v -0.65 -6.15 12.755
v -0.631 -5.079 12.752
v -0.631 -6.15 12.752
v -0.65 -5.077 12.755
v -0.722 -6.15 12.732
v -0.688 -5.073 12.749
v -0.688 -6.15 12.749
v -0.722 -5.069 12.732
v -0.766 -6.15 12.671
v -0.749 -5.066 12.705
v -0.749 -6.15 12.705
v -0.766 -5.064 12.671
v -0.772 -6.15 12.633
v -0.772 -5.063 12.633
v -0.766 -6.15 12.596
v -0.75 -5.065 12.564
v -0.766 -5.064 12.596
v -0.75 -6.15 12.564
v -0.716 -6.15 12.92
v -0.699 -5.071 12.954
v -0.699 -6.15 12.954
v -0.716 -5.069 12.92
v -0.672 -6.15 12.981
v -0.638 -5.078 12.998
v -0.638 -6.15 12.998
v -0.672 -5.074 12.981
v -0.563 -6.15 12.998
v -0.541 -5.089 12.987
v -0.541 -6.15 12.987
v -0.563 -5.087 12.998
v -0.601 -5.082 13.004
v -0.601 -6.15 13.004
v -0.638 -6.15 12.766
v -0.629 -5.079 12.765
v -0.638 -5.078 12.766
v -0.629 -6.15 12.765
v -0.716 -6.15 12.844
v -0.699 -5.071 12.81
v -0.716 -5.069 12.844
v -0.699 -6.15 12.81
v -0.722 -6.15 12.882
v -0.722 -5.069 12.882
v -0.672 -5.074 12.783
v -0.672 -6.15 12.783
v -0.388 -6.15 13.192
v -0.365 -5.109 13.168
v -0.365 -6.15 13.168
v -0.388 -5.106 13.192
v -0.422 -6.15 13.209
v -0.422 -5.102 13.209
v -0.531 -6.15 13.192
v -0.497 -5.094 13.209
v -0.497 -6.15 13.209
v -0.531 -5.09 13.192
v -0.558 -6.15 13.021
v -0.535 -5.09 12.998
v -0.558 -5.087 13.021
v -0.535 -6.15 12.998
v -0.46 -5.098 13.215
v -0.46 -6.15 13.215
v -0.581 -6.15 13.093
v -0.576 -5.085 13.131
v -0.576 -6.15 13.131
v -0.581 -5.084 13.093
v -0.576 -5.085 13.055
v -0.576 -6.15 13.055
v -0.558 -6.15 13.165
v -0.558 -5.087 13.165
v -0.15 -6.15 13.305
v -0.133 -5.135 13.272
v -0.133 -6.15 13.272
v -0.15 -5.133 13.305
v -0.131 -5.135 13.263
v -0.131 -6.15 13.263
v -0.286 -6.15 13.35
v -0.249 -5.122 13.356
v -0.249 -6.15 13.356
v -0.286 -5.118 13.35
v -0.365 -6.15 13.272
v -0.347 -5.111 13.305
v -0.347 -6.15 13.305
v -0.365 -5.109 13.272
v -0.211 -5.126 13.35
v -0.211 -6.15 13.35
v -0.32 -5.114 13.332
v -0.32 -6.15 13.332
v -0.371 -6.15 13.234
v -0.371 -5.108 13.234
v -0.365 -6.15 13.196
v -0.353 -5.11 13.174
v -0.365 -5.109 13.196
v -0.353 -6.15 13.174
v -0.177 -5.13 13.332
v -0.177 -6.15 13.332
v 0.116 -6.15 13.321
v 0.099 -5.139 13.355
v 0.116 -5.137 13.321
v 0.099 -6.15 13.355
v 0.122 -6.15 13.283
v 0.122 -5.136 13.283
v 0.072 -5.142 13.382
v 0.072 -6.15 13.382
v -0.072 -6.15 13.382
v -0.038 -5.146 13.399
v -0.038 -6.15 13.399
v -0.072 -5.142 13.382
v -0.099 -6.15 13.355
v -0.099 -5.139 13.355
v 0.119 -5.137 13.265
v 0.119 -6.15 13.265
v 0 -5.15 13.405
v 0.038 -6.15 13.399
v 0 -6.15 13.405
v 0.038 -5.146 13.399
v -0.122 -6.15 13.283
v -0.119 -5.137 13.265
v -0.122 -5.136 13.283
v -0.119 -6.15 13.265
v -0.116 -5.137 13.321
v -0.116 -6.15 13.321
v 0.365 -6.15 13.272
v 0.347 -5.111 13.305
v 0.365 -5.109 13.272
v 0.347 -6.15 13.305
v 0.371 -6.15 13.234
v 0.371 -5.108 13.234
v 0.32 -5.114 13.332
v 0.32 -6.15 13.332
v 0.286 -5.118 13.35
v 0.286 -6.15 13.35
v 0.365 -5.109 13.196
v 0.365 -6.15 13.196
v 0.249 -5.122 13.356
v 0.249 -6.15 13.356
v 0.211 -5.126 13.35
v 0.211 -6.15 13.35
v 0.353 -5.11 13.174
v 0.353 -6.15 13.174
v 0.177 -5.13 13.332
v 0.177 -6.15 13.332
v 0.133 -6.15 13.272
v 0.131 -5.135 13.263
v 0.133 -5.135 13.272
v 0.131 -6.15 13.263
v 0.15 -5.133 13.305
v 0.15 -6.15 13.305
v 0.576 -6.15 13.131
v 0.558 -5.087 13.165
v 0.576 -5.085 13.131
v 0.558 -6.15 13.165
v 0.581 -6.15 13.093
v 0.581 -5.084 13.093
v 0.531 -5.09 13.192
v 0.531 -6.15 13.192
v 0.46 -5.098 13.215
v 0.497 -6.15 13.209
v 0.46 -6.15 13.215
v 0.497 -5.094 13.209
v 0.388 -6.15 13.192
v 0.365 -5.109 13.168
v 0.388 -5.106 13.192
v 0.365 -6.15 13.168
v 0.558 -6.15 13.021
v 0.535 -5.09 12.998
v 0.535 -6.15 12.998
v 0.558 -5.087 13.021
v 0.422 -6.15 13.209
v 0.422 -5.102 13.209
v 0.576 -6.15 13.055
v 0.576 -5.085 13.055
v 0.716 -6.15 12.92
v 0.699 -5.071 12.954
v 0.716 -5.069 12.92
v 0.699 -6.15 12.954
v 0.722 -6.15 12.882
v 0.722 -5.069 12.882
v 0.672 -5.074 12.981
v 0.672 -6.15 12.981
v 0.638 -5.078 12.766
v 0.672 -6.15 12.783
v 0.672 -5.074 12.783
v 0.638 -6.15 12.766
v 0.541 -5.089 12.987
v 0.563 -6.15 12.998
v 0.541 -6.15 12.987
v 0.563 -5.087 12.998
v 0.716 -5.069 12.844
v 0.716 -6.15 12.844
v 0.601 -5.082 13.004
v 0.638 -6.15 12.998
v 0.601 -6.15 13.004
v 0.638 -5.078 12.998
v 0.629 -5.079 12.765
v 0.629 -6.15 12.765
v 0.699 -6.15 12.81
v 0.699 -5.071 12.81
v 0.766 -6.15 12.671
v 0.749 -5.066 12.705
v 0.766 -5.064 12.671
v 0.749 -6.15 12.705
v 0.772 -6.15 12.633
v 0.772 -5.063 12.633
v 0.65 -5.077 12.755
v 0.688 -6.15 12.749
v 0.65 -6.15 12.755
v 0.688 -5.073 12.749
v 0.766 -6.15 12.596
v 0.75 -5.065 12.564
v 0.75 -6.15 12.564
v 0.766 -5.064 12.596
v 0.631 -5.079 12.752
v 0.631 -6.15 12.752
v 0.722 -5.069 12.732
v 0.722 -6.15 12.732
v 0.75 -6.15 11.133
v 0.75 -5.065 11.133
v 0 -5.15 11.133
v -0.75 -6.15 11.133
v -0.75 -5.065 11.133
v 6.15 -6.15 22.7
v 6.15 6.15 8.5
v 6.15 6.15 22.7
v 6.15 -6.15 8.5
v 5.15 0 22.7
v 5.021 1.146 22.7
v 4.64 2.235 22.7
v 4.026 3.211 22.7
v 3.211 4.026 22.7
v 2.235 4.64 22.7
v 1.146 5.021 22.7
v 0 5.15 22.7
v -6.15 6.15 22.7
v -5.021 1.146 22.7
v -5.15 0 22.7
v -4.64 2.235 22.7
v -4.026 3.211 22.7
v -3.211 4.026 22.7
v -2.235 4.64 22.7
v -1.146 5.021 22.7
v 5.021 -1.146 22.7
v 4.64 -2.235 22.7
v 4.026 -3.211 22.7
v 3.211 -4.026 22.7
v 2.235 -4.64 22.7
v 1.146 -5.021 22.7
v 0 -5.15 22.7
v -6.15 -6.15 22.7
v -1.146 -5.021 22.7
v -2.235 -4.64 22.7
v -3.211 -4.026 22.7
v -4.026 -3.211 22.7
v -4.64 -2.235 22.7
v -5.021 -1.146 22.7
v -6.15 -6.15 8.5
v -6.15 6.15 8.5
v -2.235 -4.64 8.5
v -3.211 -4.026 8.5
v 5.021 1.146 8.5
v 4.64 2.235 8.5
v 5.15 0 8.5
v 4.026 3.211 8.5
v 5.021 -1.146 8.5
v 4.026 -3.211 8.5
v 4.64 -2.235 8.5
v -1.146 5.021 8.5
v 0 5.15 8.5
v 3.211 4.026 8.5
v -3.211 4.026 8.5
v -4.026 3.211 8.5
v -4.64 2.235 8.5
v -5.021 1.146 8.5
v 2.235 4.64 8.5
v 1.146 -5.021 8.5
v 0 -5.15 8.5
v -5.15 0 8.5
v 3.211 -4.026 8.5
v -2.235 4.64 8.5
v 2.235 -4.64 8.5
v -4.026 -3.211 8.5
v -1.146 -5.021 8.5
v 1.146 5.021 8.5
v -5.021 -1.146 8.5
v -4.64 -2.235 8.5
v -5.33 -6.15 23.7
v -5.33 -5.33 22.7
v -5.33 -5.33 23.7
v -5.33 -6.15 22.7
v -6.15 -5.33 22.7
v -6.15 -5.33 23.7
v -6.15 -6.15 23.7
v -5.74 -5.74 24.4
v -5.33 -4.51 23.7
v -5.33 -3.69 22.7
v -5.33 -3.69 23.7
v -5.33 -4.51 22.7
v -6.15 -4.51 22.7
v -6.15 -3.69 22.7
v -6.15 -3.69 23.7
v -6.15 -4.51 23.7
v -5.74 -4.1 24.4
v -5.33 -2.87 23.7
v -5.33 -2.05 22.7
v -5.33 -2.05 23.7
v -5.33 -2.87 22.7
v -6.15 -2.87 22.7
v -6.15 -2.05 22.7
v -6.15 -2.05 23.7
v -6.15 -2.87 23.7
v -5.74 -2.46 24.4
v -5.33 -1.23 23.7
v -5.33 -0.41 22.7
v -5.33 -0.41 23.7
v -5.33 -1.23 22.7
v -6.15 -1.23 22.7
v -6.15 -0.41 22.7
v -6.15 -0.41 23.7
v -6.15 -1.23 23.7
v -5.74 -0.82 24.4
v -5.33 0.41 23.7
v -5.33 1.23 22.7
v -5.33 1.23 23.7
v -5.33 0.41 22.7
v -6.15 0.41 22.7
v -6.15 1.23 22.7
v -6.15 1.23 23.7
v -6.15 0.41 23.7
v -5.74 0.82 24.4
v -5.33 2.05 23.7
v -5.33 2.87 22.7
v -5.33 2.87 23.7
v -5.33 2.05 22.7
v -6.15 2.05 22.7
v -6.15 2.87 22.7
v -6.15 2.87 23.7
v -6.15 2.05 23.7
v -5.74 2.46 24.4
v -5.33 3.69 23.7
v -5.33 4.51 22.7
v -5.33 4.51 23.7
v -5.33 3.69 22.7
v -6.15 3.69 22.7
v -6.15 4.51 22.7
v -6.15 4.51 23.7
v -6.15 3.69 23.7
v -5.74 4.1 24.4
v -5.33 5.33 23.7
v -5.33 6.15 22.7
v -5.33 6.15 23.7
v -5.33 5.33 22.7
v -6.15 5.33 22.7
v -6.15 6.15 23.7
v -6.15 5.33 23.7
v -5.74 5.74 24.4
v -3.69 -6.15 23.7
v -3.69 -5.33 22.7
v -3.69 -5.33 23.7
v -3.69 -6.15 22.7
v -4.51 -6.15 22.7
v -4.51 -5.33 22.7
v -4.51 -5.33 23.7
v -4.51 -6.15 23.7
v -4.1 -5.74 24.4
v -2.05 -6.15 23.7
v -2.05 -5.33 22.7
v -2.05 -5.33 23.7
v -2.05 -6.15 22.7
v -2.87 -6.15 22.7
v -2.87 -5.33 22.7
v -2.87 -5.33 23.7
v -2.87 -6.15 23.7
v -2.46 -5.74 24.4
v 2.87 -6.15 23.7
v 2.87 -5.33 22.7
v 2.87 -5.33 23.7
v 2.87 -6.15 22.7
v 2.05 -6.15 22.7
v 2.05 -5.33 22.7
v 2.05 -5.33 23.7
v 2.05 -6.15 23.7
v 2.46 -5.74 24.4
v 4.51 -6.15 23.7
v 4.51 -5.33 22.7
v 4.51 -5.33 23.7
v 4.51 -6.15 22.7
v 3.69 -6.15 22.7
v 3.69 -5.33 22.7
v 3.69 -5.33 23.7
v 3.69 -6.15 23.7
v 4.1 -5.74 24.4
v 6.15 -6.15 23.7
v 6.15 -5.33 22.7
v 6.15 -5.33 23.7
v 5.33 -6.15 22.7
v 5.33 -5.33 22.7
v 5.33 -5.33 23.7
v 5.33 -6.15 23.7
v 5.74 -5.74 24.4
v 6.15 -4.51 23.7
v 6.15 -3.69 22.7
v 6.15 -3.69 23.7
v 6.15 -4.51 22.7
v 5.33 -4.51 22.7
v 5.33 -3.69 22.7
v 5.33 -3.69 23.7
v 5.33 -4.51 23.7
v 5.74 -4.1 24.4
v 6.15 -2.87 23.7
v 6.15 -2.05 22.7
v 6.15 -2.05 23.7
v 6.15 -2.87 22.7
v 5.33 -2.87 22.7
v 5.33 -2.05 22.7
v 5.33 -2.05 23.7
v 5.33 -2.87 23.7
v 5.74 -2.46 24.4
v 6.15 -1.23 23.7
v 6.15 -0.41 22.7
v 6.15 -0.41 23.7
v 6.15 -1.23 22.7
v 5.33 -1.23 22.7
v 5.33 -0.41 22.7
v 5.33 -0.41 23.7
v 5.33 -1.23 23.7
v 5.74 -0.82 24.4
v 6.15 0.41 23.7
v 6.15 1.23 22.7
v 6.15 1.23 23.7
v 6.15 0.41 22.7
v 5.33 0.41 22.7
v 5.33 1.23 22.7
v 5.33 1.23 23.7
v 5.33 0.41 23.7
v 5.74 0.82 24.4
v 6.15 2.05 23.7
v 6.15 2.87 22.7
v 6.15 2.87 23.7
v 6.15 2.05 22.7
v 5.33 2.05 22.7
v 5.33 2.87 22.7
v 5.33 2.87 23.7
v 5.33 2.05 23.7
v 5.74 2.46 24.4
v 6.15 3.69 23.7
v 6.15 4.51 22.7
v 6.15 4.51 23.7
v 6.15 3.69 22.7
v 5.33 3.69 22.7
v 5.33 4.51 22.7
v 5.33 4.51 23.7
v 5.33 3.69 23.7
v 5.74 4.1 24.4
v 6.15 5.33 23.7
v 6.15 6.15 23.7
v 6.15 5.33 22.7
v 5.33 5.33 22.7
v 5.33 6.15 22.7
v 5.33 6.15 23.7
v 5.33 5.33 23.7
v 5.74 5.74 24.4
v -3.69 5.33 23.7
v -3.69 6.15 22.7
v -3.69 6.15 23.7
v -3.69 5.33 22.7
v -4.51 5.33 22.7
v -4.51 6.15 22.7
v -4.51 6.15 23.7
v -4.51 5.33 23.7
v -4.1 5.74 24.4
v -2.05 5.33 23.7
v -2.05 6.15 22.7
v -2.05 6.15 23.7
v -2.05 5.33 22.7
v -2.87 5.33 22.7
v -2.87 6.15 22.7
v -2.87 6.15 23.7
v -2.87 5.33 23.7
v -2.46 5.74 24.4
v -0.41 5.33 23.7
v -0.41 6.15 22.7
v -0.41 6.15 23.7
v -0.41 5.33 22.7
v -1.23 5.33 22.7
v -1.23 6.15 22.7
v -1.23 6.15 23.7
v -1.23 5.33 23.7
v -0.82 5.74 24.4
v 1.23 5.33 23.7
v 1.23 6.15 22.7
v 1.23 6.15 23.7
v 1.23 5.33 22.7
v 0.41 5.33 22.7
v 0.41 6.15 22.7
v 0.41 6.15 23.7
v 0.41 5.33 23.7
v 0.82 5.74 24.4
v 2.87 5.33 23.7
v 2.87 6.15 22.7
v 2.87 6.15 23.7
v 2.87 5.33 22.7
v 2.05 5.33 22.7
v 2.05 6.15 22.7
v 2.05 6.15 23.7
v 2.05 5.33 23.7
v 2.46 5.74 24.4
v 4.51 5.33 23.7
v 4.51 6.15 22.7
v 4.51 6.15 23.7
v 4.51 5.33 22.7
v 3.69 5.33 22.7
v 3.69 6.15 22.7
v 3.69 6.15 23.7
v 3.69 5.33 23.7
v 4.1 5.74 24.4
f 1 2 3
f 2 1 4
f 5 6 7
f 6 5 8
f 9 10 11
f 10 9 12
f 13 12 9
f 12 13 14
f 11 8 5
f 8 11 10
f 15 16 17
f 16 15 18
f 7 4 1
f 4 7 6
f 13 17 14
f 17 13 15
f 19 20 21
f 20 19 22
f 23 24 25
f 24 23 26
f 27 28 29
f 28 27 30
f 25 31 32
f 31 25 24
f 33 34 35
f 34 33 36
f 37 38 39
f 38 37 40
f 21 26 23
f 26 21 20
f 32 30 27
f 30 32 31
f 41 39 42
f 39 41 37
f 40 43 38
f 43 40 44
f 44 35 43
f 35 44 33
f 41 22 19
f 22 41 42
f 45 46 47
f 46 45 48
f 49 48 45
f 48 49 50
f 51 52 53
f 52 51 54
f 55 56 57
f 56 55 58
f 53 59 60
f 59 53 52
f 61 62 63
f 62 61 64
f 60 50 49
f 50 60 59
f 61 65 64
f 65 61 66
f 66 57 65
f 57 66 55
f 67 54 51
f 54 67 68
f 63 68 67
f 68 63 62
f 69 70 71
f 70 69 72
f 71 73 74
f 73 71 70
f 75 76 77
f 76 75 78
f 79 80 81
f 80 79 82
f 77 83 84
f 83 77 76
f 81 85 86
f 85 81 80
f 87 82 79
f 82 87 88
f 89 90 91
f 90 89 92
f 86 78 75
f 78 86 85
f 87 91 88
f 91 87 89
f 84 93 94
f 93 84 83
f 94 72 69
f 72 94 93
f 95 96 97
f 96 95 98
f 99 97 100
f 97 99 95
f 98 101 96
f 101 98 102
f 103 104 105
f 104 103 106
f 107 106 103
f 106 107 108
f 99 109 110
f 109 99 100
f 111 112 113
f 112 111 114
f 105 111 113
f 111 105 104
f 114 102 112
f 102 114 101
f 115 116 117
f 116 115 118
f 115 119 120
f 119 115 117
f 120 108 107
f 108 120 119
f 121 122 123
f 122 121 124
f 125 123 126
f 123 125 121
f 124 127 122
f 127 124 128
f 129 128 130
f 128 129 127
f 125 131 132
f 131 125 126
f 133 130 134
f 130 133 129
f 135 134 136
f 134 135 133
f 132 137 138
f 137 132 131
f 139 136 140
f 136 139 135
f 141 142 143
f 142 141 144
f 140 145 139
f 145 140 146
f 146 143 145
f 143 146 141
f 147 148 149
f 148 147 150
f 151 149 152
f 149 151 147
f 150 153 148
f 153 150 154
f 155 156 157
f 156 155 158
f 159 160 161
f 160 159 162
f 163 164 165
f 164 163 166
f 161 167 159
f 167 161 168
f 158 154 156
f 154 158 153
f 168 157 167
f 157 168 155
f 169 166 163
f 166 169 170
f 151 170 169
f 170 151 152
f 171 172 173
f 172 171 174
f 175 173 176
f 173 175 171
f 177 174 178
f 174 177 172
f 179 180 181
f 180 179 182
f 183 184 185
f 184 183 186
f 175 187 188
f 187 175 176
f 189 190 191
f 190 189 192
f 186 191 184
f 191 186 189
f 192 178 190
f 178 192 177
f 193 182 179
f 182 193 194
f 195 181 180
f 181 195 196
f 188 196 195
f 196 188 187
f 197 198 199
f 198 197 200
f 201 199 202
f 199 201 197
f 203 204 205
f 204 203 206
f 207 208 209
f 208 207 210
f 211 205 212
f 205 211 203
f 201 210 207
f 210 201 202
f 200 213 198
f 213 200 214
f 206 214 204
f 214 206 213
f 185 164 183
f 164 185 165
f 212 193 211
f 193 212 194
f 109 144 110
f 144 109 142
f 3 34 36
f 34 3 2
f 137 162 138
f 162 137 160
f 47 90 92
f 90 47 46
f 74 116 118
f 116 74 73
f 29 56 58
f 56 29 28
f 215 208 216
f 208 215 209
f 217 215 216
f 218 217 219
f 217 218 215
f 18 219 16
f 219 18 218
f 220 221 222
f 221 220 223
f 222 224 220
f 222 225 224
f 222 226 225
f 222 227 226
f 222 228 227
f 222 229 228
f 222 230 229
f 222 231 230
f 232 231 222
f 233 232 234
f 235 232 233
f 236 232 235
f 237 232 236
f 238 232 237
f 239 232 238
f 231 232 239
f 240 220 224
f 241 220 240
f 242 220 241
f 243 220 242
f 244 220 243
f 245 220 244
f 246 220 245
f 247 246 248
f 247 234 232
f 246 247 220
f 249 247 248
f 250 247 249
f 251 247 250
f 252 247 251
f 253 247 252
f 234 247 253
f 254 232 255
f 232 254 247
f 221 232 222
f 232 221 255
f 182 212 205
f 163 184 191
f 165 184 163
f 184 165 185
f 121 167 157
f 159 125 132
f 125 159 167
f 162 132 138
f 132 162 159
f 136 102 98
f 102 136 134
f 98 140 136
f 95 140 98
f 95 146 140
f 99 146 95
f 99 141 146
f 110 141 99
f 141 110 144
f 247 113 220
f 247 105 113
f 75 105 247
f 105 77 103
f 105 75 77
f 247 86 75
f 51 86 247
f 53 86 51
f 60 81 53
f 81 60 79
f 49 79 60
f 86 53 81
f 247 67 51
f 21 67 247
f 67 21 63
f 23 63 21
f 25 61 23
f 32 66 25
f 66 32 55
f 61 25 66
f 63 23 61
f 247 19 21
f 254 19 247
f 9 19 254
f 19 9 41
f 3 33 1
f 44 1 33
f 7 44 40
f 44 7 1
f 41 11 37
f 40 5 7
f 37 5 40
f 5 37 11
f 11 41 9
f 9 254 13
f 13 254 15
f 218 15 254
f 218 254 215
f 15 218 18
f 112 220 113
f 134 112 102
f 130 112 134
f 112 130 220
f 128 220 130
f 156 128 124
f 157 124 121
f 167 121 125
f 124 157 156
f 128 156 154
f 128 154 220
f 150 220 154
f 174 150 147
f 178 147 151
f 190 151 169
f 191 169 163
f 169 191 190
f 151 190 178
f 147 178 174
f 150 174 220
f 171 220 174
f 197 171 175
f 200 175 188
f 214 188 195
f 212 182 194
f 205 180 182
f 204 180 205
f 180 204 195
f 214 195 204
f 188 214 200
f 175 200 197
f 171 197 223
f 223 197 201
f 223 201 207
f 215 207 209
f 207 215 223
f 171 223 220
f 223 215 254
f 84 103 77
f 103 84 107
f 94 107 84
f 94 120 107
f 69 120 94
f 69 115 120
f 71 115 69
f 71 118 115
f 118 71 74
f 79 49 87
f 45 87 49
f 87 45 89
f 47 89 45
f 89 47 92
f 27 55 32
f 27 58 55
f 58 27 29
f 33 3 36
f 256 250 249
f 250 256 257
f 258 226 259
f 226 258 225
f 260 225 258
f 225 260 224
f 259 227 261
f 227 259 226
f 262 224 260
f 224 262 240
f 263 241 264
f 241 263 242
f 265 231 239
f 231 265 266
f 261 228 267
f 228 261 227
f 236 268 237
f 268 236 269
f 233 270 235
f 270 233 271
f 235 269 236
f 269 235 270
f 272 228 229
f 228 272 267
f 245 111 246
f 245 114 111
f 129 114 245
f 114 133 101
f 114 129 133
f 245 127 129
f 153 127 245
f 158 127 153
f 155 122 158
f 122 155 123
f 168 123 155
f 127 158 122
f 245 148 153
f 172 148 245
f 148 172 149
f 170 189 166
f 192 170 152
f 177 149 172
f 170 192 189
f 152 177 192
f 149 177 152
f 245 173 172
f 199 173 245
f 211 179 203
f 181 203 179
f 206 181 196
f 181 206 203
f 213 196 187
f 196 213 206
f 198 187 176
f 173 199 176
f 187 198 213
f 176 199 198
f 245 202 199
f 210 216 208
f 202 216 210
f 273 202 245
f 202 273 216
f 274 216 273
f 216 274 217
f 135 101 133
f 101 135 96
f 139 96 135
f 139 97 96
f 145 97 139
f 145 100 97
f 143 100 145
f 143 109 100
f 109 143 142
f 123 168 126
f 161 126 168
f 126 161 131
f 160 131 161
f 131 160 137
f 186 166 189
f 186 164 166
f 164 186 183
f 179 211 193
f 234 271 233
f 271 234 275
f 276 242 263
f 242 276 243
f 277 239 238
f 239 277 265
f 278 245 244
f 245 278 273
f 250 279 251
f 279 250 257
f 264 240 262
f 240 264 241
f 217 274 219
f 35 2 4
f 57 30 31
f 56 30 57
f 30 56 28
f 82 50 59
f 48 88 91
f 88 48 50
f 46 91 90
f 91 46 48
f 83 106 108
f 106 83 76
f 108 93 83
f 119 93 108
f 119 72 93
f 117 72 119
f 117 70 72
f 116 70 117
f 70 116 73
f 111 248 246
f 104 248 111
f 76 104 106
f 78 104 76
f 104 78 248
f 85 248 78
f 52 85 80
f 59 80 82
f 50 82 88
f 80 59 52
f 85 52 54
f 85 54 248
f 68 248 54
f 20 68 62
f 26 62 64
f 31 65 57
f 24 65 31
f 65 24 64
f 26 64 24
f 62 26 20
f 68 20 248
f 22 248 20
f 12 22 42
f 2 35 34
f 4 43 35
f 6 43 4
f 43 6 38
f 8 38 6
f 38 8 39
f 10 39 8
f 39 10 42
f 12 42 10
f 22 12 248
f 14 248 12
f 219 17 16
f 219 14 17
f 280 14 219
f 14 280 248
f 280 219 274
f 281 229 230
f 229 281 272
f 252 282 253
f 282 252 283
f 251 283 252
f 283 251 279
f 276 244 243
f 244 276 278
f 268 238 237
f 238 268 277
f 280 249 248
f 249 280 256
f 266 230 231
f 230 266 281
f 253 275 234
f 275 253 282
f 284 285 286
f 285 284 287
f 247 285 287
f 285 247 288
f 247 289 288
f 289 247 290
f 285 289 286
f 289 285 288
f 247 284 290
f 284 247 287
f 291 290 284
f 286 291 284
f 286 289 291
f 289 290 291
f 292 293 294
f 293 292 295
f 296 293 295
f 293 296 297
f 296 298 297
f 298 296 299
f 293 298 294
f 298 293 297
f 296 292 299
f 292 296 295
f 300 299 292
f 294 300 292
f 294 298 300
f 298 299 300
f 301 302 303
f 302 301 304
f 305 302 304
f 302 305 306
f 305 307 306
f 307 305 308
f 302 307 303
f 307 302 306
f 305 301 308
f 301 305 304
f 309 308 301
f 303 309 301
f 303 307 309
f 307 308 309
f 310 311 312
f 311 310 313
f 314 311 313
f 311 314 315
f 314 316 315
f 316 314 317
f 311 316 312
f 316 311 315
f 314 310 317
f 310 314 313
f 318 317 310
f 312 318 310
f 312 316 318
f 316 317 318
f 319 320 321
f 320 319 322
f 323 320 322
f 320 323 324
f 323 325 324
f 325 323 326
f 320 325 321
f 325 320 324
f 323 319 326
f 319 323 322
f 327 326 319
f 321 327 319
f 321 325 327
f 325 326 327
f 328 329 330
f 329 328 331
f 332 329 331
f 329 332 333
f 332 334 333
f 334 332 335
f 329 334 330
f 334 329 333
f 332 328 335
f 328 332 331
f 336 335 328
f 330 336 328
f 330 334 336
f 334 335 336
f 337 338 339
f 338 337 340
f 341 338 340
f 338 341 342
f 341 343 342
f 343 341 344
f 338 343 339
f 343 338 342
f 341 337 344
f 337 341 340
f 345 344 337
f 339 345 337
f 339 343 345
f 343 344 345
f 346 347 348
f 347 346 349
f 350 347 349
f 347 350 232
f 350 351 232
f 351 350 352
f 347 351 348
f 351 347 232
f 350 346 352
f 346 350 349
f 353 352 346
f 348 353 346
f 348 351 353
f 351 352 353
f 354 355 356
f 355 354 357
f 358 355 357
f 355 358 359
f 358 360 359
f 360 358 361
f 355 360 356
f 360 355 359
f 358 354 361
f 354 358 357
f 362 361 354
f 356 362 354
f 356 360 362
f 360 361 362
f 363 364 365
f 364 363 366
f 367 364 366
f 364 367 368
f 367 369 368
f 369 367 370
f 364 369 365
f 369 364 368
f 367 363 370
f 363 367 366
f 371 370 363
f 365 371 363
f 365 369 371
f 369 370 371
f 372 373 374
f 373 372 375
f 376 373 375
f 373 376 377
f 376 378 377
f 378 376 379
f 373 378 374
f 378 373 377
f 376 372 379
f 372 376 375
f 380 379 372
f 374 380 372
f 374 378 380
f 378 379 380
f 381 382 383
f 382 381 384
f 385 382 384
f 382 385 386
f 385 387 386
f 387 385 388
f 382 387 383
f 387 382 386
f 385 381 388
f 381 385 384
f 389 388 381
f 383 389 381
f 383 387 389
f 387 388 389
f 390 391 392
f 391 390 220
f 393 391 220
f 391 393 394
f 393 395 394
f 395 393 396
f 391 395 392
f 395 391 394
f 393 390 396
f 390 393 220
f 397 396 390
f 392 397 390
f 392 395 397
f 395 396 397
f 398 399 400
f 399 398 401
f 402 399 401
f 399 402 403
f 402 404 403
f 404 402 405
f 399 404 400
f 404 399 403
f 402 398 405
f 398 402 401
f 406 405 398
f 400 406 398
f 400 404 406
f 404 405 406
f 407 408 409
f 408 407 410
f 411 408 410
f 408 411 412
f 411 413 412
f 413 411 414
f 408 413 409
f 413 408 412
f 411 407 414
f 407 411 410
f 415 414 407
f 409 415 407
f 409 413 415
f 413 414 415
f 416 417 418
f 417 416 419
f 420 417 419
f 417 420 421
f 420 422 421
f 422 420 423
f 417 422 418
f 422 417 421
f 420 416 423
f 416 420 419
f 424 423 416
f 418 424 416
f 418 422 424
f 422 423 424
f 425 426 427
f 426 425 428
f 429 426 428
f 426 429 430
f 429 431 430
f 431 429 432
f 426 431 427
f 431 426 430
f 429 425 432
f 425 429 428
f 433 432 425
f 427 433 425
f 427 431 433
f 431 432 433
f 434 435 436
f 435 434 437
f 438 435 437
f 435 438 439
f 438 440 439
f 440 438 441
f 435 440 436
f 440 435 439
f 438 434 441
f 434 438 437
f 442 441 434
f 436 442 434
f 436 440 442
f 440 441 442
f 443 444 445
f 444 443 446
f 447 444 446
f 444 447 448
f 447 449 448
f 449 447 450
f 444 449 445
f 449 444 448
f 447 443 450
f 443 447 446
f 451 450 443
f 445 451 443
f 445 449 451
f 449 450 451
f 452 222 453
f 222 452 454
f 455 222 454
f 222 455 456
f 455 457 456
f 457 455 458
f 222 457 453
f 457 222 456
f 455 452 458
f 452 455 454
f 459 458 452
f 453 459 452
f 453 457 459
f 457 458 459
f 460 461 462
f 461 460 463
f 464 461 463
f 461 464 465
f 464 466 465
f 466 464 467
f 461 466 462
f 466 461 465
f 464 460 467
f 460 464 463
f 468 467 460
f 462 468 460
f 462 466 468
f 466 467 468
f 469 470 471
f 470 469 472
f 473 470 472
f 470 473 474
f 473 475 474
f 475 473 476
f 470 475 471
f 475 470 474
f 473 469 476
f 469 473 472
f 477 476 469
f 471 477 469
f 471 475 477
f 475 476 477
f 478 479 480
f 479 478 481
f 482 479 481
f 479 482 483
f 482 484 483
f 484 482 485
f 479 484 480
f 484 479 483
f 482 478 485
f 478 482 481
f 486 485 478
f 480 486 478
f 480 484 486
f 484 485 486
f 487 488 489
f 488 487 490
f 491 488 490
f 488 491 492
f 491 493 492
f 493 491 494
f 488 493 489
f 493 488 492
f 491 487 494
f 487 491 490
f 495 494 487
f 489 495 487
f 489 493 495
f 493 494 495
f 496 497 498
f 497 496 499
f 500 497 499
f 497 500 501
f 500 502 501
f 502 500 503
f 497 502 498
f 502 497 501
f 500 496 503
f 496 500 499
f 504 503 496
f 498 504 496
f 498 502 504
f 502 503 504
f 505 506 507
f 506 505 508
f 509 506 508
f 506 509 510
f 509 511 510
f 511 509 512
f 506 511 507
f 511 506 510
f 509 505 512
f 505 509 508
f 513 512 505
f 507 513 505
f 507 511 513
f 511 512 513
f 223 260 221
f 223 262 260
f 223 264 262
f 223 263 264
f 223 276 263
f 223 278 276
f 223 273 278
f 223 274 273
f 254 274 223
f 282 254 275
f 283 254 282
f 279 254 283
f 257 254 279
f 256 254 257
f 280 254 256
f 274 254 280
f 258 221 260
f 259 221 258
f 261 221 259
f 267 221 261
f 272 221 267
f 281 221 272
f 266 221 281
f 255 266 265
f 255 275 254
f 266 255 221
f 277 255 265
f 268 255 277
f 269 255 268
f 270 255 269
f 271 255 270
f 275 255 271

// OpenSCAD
radio = 4.2/2;
ancho=sqrt(2*radio*radio);
rTH=17; //sqrt(2*pow(2,12.3))/2;
ladoAlmTH = 12.3/15;
dCubo=3+radio*sin(45);//+radio;sqrt(2*3*3);

module torre_homenaje(){
//
	
	difference(){
		cube(size=[12.3,12.3,22.7+4]);
		translate([2/2,2/2,-1])agujeroTH();//cube(size=[12.3-3,12.3-3,22.7-2]);
		translate([12.3/2-1.5/2,-ancho/2,22.7/3*2])
			union(){
				cube(size=[1.5,5,1.5]);
				translate([1.5/2,5,1.5])rotate([90,0,0])lobulada(radio=1.3/2);
			}		
	}
	translate([0,0,22.7+4])almenasTH();


}

module cubo(){
	difference(){
		cylinder(h = 8.30+4, r = radio, center = false, $fn=20);
		for ( i = [0 : 7] )
		{
			rotate([0,0,i*45])translate([0,0,7.8+4])cube(size=[.5,radio*6,1],center=true);
		}
		translate([0,0,7.3+4])cylinder(h = 8.30, r = radio/2, center = false, $fn=20);
	}
	translate([0,0,-0])cylinder(h = 4, r1= radio + .2, r2 = radio, center = false, $fn=20);
}

module muralla(){
	difference(){
		cube(size=[12.3+dCubo*2,12.3+dCubo*2,6+4]);
		translate([ancho/2,ancho/2,-50])cube(size=[12.3+dCubo*2-ancho,12.3+dCubo*2-ancho,100]);
		translate([ancho/2-0.75,ancho/2-0.75,4+4])cube(size=[12.3+dCubo*2-ancho+1.5,12.3+dCubo*2-ancho+1.5,100]);
		translate([12.3+dCubo*2-ancho-3,-ancho/2,2+4])
			union(){
				cube(size=[1.5,5,1.5]);
				translate([1.5/2,5,1.5])rotate([90,0,0])cylinder(h=5,r=1.5/2,$fn=20);
			}	

		translate([0,0,4])agujerosMuralla();
	}
	//translate([12.3+dCubo*2-ancho-3,-4.3,1.65+4])rotate([2,0,0])cube(size=[1.5,4.8,0.2]);
}

module castillo(){
	translate([0,0,-4])torre_homenaje();
	translate([-dCubo,-dCubo,-4]) cubo();
	translate([-dCubo,12.3 + dCubo,-4]) cubo();
	translate([12.3 + dCubo,-dCubo,-4]) cubo();
	translate([12.3 + dCubo,12.3 + dCubo,-4]) cubo();
	translate([-dCubo,-dCubo,-4])muralla();


}

module almenaTH(){
	cube(size=[ladoAlmTH,ladoAlmTH,1]);
	polyhedron(
  points=[ [0,0,1],[ladoAlmTH,0,1],[ladoAlmTH,ladoAlmTH,1],[0,ladoAlmTH,1], // the four points at base
           [ladoAlmTH/2,ladoAlmTH/2,1.7]  ],                                 // the apexont 
faces=[ [0,1,4],[1,2,4],[2,3,4],[3,0,4],          // each triangle side
              [1,0,3],[2,1,3] ]                         // two triangles for square base

 );

}

module almenasTH(){
		for ( i = [0 : 7] )
	{
    		translate([0, i*2*ladoAlmTH, 0])
    		almenaTH();
	}


		for ( i = [0 : 2] )
	{
    		translate([i*2*ladoAlmTH,0, 0])
    		almenaTH();
	}

		for ( i = [5 : 7] )
	{
    		translate([i*2*ladoAlmTH,0, 0])
    		almenaTH();
	}
		for ( i = [0 : 7] )
	{
    		translate([7*2*ladoAlmTH, i*2*ladoAlmTH, 0])
    		almenaTH();
	}
		for ( i = [0 : 7] )
	{
    		translate([i*2*ladoAlmTH,7*2*ladoAlmTH, 0])
    		almenaTH();
	}

}

module agujerosMuralla(){
		for ( i = [0 : 7] )
	{
    		translate([ 3*i,0, 5.4])
    		cube(size=[0.5,2,0.8]);
	}
		for ( i = [0 : 7] )
	{
    		translate([ 0,3*i, 5.4])
    		cube(size=[2,0.5,0.8]);
	}
		for ( i = [0 : 7] )
	{
    		translate([ 3*i,12.3+dCubo*2-2, 5.4])
    		cube(size=[0.5,2,0.8]);
	}
		for ( i = [0 : 7] )
	{
    		translate([ 12.3+dCubo*2-2,3*i, 5.4])
    		cube(size=[2,0.5,0.8]);
	}
}

module lobulada(radio=1.5/2,n=8){

	cylinder(h=5,r=radio,$fn=20);
	for ( i = [-90 : 180/n:90] )
	{
    		translate([ radio*sin(i),radio*cos(i), ])
    		cylinder(h=5,r=radio*1.5/n,$fn=20);
	}

}
module tierra(){
	difference(){
		import("CastillNogales_directo_ext_rev_repaired.stl");

		difference(){
			cube(size=[140,140,140],center=true);
			rotate([0,0,55])translate([-14,-14,0])minkowski(){
				cube(size=[27,27,10],center=true);
				translate([14,14,0])cylinder(r=3,h=5,$fn=20);

			}

		}
		rotate([0,0,55])translate([-9,-9,0])minkowski(){
			cube(size=[18,18,5],center=true);
			translate([9,9,0])cylinder(r=5.3,h=5,$fn=20);

		}
		//rotate([0,0,55])cube(size=[10,10,60],center=true);
				
	}
	rotate([0,0,55])difference(){
		cube(size=[20,20,3.5],center=true);
		cube(size=[11,11,60],center=true);
	}
	
}

module agujeroTH(){

	translate([10.3/2,10.3/2,2])
	cylinder(h=22.7+4,r=10.3/2,$fn=28);

	

}


module base(){
	anchoBase =30;
	desp = anchoBase/2 - 12.3/2;
	difference(){
		translate([-desp,-desp,-.5])cube(size=[anchoBase,anchoBase,.51]);
		translate([2/2,2/2,-5])cube(size=[12.3-3,12.3-3,22.7-2]);
	}
}

//rotate([0,0,-55])
/*union(){
translate([-12.3/2,-12.3/2,0])castillo();
rotate([0,0,-55])tierra();
}*/


difference(){
translate([-12.3/2,-12.3/2,0])
	castillo();
/*translate([-26/2,-26/2,-4])
	minkowski(){
				cube(size=[21,21,1],center=true);
				translate([13,13,0])cylinder(r=3,h=1,$fn=20);

			}*/

cube(size=[41,41,17],center=true);
}
